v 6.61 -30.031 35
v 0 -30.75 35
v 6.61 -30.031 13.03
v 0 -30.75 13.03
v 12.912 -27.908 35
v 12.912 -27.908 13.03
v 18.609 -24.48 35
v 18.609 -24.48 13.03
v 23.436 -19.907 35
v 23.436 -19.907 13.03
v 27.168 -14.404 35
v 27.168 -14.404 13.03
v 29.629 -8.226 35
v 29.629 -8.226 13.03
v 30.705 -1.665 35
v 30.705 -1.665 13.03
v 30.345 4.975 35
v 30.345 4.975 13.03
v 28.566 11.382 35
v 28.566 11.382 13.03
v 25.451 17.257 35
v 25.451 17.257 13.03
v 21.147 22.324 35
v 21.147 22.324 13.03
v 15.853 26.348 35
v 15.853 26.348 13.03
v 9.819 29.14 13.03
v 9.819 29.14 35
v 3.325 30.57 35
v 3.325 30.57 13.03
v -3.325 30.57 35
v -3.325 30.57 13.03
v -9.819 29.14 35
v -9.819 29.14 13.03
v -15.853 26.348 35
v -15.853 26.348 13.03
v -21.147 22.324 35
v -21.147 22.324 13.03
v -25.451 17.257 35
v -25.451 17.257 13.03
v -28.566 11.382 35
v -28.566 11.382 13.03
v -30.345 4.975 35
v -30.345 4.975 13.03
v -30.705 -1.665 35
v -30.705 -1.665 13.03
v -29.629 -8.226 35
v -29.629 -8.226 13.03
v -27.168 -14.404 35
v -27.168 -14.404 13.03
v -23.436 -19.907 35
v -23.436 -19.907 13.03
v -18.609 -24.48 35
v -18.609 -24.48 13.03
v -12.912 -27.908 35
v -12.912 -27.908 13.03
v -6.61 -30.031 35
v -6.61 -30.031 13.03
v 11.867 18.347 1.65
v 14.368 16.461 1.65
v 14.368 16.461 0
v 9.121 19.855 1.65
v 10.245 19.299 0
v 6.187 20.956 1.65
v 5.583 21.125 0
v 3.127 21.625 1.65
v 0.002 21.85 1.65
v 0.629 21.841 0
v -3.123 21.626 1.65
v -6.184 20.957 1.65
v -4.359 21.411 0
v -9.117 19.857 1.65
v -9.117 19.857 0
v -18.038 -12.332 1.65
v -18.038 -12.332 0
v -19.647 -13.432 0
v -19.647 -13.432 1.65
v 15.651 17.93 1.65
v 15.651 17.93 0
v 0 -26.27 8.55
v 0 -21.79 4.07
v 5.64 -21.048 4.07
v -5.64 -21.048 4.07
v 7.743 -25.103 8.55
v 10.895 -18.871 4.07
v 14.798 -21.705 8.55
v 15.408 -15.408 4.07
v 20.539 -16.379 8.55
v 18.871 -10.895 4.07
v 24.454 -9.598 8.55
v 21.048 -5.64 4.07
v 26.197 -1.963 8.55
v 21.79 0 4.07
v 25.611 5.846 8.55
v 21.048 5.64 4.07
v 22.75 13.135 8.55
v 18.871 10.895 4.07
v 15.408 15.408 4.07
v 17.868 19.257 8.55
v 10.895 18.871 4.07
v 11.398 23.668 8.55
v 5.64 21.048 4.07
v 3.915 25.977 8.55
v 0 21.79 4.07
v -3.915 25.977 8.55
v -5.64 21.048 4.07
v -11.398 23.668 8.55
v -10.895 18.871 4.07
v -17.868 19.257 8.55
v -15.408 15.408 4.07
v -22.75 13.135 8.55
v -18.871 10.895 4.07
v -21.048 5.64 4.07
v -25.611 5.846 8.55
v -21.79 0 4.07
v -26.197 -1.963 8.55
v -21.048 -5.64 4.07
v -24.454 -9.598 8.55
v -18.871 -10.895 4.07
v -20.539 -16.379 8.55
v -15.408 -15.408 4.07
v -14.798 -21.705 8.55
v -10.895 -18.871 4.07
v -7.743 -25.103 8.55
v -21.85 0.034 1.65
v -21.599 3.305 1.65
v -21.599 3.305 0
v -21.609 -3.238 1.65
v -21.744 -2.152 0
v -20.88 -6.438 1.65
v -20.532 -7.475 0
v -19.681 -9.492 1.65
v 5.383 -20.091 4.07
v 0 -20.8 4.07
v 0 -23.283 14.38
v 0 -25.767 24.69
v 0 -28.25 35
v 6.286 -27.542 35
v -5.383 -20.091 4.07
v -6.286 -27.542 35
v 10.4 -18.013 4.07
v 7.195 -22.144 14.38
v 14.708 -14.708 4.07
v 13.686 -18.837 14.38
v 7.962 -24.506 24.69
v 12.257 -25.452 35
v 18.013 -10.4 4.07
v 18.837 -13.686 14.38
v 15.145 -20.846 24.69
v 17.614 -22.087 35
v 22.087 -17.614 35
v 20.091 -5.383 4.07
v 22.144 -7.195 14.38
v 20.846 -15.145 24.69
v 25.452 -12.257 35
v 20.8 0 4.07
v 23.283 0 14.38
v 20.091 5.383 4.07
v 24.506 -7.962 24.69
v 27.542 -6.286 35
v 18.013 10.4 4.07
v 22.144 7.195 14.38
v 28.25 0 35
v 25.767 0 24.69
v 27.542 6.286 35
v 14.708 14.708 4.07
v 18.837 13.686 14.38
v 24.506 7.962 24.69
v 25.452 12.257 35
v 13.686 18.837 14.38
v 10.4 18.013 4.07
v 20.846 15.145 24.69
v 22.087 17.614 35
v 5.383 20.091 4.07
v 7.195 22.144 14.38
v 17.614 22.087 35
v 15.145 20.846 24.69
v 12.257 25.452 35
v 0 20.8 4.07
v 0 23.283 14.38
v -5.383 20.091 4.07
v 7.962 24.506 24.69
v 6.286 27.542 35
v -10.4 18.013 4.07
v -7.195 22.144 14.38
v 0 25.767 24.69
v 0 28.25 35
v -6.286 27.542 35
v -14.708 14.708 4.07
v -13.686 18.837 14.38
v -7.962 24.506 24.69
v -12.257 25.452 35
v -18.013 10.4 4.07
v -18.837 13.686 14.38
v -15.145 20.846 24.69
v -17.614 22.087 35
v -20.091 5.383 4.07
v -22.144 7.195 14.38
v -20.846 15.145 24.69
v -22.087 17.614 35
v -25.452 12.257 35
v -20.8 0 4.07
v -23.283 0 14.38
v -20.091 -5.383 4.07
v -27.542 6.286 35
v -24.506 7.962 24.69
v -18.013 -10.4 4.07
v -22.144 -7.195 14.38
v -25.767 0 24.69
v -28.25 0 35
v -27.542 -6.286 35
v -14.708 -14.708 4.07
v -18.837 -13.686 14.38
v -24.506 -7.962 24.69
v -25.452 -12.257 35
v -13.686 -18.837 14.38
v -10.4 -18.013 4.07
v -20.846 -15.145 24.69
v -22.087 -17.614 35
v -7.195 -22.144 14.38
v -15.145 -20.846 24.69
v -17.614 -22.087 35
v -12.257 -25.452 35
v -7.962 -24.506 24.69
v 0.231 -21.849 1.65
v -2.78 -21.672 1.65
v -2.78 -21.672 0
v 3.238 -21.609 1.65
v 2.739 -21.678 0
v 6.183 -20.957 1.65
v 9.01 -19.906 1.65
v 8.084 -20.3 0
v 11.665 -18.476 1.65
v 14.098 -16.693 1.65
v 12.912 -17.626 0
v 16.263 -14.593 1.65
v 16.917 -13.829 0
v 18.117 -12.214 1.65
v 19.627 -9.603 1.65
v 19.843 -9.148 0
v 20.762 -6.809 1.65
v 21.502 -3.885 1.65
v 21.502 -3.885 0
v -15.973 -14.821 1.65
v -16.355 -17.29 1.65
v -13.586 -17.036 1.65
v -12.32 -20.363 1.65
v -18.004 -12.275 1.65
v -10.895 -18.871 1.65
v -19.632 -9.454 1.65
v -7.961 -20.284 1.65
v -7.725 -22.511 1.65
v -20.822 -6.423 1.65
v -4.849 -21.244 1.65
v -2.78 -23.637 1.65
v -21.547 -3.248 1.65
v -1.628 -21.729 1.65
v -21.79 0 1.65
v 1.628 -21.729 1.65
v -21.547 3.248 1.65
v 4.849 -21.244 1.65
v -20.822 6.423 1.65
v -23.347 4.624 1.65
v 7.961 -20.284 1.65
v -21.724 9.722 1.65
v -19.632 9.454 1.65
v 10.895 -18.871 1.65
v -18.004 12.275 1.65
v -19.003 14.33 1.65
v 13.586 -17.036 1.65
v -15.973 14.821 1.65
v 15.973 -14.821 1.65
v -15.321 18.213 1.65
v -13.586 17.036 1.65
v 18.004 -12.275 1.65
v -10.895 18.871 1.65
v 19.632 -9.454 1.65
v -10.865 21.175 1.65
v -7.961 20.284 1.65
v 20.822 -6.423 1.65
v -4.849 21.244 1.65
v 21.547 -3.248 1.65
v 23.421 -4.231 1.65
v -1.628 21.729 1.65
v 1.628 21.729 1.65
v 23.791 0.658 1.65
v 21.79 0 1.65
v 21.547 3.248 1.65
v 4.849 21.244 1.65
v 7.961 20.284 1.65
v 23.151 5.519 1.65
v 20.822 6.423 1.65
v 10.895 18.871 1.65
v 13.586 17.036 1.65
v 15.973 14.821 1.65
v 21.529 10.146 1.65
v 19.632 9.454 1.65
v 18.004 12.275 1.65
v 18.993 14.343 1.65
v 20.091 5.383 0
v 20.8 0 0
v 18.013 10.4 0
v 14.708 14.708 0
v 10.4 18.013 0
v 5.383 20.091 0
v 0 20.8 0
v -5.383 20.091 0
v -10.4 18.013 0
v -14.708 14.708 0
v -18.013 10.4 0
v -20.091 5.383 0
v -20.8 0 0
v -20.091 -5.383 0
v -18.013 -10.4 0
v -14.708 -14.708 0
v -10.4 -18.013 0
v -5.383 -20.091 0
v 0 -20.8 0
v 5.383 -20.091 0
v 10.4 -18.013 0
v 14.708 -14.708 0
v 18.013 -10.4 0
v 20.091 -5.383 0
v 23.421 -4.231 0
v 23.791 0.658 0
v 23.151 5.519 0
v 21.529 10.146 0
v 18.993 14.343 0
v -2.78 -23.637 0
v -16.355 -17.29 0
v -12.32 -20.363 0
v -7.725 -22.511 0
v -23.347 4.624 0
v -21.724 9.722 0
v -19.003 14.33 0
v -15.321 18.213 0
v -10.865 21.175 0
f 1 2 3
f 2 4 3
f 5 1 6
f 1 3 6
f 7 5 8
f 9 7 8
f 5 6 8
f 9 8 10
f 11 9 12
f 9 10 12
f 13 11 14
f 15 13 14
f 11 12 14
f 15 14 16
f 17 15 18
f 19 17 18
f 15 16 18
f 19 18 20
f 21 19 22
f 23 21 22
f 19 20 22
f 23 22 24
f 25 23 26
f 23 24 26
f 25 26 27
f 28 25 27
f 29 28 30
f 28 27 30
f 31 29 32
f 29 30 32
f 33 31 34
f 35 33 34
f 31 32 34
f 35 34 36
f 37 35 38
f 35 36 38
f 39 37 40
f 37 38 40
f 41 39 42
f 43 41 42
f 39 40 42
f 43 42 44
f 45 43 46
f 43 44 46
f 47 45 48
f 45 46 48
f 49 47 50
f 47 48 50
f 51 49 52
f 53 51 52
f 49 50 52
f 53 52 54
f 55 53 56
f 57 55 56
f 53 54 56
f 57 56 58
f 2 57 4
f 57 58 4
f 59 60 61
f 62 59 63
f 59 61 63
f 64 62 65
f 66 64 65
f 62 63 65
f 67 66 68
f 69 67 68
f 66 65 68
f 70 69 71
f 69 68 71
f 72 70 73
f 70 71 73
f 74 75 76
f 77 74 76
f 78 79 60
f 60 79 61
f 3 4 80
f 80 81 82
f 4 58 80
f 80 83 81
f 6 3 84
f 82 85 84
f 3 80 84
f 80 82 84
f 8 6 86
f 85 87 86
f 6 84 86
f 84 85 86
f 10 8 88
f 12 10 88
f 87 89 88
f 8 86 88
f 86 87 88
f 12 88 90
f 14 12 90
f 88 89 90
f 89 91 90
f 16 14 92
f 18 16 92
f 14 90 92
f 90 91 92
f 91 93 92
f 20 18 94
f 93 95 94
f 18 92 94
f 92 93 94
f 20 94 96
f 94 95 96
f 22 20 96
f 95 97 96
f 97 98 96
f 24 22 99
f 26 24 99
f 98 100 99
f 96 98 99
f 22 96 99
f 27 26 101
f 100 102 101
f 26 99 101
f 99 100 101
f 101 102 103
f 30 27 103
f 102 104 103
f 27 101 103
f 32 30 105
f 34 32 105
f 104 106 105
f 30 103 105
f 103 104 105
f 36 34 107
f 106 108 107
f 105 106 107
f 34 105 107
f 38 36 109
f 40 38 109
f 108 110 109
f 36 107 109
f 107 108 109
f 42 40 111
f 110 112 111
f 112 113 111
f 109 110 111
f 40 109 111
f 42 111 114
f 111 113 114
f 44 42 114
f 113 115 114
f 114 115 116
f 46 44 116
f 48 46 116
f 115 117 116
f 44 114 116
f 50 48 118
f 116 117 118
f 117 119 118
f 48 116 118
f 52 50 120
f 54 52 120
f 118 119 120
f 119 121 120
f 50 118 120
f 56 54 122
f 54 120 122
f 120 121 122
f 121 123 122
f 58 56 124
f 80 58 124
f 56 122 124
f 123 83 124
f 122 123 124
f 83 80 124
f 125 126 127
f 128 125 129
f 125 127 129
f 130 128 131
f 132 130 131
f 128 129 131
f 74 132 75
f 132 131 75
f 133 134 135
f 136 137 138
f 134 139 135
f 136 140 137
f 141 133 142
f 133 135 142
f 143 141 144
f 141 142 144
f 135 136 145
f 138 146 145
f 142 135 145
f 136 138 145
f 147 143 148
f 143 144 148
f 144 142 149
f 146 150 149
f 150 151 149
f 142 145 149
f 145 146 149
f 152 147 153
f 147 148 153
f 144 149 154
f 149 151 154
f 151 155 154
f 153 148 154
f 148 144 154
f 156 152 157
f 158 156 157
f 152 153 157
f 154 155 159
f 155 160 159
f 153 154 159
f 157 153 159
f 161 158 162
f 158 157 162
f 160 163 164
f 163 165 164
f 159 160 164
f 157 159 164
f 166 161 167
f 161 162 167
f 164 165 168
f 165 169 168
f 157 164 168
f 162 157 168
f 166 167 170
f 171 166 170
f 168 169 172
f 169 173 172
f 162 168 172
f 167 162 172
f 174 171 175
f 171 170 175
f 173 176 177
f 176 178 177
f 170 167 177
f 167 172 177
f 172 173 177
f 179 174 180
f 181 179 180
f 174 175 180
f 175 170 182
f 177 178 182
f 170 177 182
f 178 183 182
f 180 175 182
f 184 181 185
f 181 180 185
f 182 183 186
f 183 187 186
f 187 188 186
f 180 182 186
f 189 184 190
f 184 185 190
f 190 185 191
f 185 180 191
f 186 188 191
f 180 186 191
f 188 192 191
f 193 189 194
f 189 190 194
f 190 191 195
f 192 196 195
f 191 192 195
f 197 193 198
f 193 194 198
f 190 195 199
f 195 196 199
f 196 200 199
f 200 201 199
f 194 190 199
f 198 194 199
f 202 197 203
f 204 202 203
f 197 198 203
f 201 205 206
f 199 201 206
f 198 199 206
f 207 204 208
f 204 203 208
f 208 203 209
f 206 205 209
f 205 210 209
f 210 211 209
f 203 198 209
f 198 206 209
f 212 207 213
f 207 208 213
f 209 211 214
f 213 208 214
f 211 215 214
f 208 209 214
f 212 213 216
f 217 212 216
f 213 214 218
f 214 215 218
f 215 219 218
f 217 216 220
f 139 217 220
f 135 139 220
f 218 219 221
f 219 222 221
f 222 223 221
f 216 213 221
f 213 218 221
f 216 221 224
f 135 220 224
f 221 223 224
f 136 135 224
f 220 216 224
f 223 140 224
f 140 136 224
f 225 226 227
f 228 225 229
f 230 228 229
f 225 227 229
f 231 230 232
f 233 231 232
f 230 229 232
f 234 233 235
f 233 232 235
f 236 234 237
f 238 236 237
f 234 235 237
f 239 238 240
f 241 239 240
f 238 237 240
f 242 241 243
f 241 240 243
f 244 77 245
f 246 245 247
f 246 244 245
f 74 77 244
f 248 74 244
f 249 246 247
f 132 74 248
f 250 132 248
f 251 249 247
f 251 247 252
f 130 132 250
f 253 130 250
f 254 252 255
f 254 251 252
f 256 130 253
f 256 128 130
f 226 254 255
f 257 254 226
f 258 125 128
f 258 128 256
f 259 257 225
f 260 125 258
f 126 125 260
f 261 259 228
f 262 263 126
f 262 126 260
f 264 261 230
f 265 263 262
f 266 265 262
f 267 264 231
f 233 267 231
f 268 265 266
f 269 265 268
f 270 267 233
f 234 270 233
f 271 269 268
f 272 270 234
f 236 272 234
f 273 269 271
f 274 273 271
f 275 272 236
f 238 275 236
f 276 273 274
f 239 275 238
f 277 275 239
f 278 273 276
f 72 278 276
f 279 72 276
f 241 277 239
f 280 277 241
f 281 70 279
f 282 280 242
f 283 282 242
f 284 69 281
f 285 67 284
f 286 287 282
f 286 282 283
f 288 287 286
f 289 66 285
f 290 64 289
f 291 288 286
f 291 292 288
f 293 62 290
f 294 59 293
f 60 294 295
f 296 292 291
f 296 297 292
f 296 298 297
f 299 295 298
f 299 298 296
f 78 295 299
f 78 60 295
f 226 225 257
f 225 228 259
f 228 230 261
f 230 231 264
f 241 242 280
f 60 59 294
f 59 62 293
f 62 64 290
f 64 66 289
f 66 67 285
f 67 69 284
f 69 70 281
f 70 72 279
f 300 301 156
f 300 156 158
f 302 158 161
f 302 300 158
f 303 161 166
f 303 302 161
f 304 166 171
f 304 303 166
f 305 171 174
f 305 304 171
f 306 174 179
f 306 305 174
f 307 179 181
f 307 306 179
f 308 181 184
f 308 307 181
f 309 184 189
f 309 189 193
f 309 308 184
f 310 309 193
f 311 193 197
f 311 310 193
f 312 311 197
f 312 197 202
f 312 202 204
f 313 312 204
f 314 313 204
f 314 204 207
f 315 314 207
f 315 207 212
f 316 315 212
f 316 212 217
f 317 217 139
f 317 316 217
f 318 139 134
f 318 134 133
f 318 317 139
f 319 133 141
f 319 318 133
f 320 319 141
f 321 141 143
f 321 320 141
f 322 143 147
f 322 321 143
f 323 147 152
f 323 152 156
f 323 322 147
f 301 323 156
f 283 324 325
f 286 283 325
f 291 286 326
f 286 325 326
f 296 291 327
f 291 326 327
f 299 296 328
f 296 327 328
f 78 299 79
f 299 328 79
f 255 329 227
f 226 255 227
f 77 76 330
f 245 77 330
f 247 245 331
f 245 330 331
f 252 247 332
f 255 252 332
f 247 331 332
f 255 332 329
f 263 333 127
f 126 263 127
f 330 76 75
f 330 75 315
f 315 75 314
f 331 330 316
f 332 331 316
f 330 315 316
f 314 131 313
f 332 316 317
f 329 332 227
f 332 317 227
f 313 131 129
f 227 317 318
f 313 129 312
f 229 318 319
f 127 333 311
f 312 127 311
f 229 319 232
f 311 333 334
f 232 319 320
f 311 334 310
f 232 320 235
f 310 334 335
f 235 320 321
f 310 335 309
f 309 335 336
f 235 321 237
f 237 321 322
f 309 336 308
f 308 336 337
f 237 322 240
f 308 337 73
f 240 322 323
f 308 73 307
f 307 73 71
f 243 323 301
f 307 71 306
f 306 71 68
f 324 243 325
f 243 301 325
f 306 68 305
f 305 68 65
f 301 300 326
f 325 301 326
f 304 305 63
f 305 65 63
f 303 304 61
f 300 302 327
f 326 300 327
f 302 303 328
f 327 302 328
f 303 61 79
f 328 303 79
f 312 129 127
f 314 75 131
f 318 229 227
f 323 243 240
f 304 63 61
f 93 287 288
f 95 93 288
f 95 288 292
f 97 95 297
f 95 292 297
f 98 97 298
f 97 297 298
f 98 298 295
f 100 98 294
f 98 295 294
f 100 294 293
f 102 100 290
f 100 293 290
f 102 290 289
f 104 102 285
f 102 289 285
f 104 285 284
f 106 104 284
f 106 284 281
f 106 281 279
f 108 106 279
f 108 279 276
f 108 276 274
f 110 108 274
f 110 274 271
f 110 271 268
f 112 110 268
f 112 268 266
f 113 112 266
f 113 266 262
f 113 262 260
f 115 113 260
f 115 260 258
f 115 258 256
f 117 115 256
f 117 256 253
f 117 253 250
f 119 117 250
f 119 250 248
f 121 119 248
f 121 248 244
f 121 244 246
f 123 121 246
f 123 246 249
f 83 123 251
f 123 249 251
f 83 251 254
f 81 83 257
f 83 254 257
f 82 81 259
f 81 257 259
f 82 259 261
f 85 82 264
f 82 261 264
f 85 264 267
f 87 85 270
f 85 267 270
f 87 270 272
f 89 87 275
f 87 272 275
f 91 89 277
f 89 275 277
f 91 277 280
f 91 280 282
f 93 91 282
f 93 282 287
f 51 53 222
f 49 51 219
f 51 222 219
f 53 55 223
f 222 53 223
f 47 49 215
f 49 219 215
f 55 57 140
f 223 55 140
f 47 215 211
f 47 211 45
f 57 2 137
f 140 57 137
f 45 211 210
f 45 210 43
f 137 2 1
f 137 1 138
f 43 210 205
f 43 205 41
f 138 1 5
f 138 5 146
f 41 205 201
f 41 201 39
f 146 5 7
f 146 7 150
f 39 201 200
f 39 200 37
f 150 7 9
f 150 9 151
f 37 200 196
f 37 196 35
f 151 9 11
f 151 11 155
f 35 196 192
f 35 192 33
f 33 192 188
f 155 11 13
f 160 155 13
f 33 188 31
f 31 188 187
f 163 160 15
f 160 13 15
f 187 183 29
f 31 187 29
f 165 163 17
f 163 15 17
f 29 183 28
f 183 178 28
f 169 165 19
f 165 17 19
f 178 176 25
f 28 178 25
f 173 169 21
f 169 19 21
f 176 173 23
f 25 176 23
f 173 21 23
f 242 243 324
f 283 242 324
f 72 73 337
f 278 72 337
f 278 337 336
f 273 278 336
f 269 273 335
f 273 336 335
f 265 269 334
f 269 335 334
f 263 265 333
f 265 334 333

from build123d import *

# Parameters (mm, degrees)
F0_R     = 20.8
F1_DEPTH = 1.65
F2_R     = 21.79
F2_R_2   = 20.8
F3_DEPTH = 2.42


# Not quite as in the source:
# - a feature names something its author has since deleted; it is built from what else it names


with BuildPart() as f1:
    # F0 (on Top) → F1 (new body)
    with BuildSketch(Plane.XY):
        with BuildLine():
            Line((-23.3465658477, 4.6236201314), (-21.5985300328, 3.3054501087))
            ThreePointArc((-21.5985300328, 3.3054501087), (-21.3045670847, -4.8515895677), (-18.0375785467, -12.3315960108))
            Line((-18.0375785467, -12.3315960108), (-19.6473395611, -13.4321274626))
            ThreePointArc((-19.6473395611, -13.4321274626), (-12.3198747915, -20.3632189283), (-2.7797791084, -23.6371070165))
            Line((-2.7797791084, -23.6371070165), (-2.7797791084, -21.6724555164))
            ThreePointArc((-2.7797791084, -21.6724555164), (12.9124709806, -17.6264174799), (21.5019218593, -3.884566431))
            Line((21.5019218593, -3.884566431), (23.4208576774, -4.2312439843))
            ThreePointArc((23.4208576774, -4.2312439843), (22.4595443709, 7.8745708867), (15.6508005462, 17.930210324))
            Line((15.6508005462, 17.930210324), (14.368487056, 16.4611384698))
            ThreePointArc((14.368487056, 16.4611384698), (3.1267598049, 21.6251213435), (-9.1172854603, 19.8569284089))
            Line((-9.1172854603, 19.8569284089), (-10.8653212752, 21.1750984316))
            ThreePointArc((-10.8653212752, 21.1750984316), (-19.0026620137, 14.329648858), (-23.3465658477, 4.6236201314))
        make_face()
        Circle(F0_R, mode=Mode.SUBTRACT)
    extrude(amount=F1_DEPTH)

    # F2 (on face) → F3 (join)
    with BuildSketch(Plane.XY.offset(1.65)):
        Circle(F2_R)
        Circle(F2_R_2, mode=Mode.SUBTRACT)
    extrude(amount=F3_DEPTH)

    # F4 (on Right) → F5 (revolve)
    with BuildSketch(Plane.YZ):
        Polygon((-21.79, 4.07), (-20.8, 4.07), (-28.25, 35), (-30.75, 35), (-30.75, 13.03), align=None)
    revolve(axis=Axis((0, 0, 17.5), (0, 0, 1)))


solid = f1.part
